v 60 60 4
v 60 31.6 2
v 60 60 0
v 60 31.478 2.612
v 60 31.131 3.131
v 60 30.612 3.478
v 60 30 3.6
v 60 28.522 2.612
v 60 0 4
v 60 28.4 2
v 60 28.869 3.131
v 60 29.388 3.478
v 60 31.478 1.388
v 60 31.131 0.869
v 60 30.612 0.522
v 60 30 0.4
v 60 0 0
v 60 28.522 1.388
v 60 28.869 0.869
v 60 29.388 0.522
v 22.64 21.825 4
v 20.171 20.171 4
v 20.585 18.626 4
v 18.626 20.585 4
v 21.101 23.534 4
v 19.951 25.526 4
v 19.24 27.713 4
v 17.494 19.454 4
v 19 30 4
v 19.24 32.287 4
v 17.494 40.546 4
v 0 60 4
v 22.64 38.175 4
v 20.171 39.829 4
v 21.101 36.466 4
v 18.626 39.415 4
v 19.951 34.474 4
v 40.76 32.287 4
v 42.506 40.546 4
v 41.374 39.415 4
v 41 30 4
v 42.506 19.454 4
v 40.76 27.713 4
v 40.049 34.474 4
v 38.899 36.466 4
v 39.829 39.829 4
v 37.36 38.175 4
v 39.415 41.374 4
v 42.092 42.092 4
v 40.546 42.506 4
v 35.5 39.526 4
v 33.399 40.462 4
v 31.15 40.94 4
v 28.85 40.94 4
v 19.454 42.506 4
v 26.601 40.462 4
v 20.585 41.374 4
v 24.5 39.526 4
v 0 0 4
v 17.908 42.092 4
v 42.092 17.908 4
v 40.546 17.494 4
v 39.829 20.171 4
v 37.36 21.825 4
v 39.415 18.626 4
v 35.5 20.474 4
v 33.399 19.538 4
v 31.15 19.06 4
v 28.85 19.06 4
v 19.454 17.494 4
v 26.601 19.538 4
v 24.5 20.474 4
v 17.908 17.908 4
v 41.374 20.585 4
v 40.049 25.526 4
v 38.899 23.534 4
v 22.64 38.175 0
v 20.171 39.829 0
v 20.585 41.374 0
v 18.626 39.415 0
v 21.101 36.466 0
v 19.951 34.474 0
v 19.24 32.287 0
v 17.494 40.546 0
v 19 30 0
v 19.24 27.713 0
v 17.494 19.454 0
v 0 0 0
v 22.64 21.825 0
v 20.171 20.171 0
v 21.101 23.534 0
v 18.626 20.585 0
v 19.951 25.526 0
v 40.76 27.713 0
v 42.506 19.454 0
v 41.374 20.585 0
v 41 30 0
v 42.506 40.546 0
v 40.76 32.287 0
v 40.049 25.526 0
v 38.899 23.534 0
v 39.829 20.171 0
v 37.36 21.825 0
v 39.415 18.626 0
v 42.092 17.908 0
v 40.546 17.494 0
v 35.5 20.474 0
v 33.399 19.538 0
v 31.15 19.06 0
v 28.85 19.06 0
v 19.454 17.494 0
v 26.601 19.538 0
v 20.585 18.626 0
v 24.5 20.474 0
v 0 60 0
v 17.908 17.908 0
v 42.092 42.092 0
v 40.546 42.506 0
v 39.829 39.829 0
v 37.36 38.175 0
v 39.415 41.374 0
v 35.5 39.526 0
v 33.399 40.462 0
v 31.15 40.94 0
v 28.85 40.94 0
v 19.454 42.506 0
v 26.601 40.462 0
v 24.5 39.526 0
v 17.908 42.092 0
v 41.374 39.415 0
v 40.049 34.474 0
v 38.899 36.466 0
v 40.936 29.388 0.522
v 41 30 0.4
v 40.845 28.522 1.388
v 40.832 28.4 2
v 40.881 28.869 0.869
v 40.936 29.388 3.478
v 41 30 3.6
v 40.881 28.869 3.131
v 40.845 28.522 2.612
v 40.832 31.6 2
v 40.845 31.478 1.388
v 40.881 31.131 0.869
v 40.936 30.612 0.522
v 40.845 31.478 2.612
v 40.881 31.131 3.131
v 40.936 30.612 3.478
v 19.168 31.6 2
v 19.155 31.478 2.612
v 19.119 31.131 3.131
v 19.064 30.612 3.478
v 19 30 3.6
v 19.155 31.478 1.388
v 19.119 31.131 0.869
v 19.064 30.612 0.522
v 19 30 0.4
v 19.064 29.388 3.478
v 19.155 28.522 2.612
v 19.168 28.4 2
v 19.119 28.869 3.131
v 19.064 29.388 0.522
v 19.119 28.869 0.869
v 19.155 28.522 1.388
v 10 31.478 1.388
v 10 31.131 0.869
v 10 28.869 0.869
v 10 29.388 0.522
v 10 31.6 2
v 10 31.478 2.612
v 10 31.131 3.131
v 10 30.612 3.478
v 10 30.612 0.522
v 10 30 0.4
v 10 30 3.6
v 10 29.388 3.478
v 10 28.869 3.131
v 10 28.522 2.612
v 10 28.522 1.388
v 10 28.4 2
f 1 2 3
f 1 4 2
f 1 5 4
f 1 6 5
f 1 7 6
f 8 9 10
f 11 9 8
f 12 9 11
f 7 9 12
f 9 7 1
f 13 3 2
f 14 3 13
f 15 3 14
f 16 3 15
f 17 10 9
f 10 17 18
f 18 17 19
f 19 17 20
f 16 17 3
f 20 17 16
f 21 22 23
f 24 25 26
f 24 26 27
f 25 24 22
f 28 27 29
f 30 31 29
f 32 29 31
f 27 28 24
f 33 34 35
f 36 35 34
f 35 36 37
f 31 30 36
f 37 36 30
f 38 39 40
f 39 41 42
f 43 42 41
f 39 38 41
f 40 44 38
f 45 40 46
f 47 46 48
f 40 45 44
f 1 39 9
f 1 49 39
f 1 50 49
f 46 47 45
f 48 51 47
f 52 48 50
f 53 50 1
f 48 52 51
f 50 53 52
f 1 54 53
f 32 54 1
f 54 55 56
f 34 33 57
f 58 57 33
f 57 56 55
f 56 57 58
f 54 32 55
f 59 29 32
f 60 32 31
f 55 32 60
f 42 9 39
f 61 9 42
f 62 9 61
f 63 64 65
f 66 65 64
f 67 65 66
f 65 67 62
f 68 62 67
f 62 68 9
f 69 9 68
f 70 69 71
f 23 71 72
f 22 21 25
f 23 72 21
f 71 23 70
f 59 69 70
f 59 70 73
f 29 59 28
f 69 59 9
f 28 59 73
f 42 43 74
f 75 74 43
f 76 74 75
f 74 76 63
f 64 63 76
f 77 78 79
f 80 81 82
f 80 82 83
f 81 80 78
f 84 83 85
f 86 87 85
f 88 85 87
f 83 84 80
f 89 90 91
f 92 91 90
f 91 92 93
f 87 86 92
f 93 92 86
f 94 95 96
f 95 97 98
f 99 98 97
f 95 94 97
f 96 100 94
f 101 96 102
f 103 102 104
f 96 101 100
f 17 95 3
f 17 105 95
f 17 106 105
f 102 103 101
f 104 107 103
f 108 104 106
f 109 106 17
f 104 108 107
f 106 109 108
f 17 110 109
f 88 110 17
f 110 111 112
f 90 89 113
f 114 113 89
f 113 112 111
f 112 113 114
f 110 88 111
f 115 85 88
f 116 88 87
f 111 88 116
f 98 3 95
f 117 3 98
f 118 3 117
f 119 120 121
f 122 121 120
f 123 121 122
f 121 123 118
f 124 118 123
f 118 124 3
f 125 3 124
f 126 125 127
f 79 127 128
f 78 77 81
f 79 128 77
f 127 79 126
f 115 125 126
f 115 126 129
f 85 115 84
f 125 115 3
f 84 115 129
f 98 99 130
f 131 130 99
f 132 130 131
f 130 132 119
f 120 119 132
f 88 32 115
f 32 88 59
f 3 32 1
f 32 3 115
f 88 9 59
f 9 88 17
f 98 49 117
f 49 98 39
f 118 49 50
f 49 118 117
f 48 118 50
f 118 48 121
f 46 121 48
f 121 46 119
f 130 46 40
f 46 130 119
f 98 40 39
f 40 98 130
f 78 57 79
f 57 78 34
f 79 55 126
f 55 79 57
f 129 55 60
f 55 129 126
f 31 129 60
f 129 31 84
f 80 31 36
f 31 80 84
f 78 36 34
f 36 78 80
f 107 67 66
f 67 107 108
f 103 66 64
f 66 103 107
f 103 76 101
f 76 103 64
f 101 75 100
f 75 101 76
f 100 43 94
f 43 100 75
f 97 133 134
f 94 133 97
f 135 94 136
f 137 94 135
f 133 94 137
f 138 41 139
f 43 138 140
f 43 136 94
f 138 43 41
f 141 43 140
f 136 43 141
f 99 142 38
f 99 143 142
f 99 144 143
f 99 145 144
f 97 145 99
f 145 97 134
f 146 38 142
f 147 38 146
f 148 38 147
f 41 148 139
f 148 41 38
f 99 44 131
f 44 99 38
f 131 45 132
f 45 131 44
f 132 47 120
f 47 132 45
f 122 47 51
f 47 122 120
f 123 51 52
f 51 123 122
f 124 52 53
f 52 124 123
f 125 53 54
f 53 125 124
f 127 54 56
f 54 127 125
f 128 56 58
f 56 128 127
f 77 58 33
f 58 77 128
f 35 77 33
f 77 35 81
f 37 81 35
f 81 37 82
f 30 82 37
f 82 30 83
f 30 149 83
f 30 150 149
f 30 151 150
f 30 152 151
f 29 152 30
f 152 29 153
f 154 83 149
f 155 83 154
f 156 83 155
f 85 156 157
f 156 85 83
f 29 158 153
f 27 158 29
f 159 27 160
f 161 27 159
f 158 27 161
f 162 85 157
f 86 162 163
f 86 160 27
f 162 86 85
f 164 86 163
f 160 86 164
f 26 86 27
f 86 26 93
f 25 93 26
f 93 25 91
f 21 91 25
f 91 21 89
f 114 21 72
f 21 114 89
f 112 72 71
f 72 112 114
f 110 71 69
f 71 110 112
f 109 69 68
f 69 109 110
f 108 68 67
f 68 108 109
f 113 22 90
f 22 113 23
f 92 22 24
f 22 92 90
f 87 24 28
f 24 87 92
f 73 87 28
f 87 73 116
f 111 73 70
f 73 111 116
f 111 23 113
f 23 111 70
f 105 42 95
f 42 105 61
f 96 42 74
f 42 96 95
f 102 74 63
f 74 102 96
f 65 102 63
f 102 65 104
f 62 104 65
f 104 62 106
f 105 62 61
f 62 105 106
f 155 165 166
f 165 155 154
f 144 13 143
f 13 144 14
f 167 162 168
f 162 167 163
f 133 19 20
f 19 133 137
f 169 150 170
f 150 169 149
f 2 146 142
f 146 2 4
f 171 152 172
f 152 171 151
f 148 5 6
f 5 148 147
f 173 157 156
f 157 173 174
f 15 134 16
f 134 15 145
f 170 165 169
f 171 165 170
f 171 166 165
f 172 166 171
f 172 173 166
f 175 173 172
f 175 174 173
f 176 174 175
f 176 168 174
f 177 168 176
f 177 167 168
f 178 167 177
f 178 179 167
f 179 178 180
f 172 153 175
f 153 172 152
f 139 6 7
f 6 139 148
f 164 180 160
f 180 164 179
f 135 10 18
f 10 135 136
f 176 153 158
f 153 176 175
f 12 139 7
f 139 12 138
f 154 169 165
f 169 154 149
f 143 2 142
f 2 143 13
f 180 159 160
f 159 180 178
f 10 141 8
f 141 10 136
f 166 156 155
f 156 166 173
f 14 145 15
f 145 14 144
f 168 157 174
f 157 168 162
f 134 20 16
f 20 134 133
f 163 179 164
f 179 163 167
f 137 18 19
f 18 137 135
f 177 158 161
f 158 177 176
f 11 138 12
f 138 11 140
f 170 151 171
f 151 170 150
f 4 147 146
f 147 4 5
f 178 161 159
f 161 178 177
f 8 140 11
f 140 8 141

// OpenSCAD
// SpiderPi Corner Motor Mount v1
// Mounts NEMA17 to 2020 aluminum extrusion corner
// NEMA17 face: 42x42mm, M3 bolts on 31mm circle

nema17_w = 42.0;
nema17_bolt_circle = 31.0;
nema17_boss_d = 22.0;
nema17_boss_h = 2.0;
bolt_d = 3.2;           // M3 clearance
extrusion_w = 20.0;
plate_t = 4.0;
plate_w = 60.0;
plate_h = 60.0;
slot_w = 6.2;           // T-slot bolt head clearance
slot_offset = 10.0;     // T-nut center from edge

module nema17_face() {
    // Boss cutout
    circle(d = nema17_boss_d);
    // Bolt holes on 31mm circle
    for (a = [45, 135, 225, 315]) {
        rotate([0,0,a])
            translate([nema17_bolt_circle/2, 0])
                circle(d = bolt_d);
    }
}

module extrusion_slot() {
    square([slot_w, plate_t + 2], center = true);
}

module corner_mount() {
    difference() {
        // Main plate
        cube([plate_w, plate_h, plate_t]);
        // NEMA17 mounting pattern
        translate([plate_w/2, plate_h/2, -1])
            linear_extrude(plate_t + 2)
                nema17_face();
        // T-slot mounting holes for 2020 extrusion (X direction)
        translate([slot_offset, plate_h/2, plate_t/2])
            rotate([0,90,0])
                cylinder(d=bolt_d, h=plate_w, $fn=16);
        translate([plate_w - slot_offset, plate_h/2, plate_t/2])
            rotate([0,90,0])
                cylinder(d=bolt_d, h=plate_w, $fn=16);
    }
}

corner_mount();
// Print flat side down. Use M3x12 bolts for NEMA17, M5x8 T-nuts for extrusion.
